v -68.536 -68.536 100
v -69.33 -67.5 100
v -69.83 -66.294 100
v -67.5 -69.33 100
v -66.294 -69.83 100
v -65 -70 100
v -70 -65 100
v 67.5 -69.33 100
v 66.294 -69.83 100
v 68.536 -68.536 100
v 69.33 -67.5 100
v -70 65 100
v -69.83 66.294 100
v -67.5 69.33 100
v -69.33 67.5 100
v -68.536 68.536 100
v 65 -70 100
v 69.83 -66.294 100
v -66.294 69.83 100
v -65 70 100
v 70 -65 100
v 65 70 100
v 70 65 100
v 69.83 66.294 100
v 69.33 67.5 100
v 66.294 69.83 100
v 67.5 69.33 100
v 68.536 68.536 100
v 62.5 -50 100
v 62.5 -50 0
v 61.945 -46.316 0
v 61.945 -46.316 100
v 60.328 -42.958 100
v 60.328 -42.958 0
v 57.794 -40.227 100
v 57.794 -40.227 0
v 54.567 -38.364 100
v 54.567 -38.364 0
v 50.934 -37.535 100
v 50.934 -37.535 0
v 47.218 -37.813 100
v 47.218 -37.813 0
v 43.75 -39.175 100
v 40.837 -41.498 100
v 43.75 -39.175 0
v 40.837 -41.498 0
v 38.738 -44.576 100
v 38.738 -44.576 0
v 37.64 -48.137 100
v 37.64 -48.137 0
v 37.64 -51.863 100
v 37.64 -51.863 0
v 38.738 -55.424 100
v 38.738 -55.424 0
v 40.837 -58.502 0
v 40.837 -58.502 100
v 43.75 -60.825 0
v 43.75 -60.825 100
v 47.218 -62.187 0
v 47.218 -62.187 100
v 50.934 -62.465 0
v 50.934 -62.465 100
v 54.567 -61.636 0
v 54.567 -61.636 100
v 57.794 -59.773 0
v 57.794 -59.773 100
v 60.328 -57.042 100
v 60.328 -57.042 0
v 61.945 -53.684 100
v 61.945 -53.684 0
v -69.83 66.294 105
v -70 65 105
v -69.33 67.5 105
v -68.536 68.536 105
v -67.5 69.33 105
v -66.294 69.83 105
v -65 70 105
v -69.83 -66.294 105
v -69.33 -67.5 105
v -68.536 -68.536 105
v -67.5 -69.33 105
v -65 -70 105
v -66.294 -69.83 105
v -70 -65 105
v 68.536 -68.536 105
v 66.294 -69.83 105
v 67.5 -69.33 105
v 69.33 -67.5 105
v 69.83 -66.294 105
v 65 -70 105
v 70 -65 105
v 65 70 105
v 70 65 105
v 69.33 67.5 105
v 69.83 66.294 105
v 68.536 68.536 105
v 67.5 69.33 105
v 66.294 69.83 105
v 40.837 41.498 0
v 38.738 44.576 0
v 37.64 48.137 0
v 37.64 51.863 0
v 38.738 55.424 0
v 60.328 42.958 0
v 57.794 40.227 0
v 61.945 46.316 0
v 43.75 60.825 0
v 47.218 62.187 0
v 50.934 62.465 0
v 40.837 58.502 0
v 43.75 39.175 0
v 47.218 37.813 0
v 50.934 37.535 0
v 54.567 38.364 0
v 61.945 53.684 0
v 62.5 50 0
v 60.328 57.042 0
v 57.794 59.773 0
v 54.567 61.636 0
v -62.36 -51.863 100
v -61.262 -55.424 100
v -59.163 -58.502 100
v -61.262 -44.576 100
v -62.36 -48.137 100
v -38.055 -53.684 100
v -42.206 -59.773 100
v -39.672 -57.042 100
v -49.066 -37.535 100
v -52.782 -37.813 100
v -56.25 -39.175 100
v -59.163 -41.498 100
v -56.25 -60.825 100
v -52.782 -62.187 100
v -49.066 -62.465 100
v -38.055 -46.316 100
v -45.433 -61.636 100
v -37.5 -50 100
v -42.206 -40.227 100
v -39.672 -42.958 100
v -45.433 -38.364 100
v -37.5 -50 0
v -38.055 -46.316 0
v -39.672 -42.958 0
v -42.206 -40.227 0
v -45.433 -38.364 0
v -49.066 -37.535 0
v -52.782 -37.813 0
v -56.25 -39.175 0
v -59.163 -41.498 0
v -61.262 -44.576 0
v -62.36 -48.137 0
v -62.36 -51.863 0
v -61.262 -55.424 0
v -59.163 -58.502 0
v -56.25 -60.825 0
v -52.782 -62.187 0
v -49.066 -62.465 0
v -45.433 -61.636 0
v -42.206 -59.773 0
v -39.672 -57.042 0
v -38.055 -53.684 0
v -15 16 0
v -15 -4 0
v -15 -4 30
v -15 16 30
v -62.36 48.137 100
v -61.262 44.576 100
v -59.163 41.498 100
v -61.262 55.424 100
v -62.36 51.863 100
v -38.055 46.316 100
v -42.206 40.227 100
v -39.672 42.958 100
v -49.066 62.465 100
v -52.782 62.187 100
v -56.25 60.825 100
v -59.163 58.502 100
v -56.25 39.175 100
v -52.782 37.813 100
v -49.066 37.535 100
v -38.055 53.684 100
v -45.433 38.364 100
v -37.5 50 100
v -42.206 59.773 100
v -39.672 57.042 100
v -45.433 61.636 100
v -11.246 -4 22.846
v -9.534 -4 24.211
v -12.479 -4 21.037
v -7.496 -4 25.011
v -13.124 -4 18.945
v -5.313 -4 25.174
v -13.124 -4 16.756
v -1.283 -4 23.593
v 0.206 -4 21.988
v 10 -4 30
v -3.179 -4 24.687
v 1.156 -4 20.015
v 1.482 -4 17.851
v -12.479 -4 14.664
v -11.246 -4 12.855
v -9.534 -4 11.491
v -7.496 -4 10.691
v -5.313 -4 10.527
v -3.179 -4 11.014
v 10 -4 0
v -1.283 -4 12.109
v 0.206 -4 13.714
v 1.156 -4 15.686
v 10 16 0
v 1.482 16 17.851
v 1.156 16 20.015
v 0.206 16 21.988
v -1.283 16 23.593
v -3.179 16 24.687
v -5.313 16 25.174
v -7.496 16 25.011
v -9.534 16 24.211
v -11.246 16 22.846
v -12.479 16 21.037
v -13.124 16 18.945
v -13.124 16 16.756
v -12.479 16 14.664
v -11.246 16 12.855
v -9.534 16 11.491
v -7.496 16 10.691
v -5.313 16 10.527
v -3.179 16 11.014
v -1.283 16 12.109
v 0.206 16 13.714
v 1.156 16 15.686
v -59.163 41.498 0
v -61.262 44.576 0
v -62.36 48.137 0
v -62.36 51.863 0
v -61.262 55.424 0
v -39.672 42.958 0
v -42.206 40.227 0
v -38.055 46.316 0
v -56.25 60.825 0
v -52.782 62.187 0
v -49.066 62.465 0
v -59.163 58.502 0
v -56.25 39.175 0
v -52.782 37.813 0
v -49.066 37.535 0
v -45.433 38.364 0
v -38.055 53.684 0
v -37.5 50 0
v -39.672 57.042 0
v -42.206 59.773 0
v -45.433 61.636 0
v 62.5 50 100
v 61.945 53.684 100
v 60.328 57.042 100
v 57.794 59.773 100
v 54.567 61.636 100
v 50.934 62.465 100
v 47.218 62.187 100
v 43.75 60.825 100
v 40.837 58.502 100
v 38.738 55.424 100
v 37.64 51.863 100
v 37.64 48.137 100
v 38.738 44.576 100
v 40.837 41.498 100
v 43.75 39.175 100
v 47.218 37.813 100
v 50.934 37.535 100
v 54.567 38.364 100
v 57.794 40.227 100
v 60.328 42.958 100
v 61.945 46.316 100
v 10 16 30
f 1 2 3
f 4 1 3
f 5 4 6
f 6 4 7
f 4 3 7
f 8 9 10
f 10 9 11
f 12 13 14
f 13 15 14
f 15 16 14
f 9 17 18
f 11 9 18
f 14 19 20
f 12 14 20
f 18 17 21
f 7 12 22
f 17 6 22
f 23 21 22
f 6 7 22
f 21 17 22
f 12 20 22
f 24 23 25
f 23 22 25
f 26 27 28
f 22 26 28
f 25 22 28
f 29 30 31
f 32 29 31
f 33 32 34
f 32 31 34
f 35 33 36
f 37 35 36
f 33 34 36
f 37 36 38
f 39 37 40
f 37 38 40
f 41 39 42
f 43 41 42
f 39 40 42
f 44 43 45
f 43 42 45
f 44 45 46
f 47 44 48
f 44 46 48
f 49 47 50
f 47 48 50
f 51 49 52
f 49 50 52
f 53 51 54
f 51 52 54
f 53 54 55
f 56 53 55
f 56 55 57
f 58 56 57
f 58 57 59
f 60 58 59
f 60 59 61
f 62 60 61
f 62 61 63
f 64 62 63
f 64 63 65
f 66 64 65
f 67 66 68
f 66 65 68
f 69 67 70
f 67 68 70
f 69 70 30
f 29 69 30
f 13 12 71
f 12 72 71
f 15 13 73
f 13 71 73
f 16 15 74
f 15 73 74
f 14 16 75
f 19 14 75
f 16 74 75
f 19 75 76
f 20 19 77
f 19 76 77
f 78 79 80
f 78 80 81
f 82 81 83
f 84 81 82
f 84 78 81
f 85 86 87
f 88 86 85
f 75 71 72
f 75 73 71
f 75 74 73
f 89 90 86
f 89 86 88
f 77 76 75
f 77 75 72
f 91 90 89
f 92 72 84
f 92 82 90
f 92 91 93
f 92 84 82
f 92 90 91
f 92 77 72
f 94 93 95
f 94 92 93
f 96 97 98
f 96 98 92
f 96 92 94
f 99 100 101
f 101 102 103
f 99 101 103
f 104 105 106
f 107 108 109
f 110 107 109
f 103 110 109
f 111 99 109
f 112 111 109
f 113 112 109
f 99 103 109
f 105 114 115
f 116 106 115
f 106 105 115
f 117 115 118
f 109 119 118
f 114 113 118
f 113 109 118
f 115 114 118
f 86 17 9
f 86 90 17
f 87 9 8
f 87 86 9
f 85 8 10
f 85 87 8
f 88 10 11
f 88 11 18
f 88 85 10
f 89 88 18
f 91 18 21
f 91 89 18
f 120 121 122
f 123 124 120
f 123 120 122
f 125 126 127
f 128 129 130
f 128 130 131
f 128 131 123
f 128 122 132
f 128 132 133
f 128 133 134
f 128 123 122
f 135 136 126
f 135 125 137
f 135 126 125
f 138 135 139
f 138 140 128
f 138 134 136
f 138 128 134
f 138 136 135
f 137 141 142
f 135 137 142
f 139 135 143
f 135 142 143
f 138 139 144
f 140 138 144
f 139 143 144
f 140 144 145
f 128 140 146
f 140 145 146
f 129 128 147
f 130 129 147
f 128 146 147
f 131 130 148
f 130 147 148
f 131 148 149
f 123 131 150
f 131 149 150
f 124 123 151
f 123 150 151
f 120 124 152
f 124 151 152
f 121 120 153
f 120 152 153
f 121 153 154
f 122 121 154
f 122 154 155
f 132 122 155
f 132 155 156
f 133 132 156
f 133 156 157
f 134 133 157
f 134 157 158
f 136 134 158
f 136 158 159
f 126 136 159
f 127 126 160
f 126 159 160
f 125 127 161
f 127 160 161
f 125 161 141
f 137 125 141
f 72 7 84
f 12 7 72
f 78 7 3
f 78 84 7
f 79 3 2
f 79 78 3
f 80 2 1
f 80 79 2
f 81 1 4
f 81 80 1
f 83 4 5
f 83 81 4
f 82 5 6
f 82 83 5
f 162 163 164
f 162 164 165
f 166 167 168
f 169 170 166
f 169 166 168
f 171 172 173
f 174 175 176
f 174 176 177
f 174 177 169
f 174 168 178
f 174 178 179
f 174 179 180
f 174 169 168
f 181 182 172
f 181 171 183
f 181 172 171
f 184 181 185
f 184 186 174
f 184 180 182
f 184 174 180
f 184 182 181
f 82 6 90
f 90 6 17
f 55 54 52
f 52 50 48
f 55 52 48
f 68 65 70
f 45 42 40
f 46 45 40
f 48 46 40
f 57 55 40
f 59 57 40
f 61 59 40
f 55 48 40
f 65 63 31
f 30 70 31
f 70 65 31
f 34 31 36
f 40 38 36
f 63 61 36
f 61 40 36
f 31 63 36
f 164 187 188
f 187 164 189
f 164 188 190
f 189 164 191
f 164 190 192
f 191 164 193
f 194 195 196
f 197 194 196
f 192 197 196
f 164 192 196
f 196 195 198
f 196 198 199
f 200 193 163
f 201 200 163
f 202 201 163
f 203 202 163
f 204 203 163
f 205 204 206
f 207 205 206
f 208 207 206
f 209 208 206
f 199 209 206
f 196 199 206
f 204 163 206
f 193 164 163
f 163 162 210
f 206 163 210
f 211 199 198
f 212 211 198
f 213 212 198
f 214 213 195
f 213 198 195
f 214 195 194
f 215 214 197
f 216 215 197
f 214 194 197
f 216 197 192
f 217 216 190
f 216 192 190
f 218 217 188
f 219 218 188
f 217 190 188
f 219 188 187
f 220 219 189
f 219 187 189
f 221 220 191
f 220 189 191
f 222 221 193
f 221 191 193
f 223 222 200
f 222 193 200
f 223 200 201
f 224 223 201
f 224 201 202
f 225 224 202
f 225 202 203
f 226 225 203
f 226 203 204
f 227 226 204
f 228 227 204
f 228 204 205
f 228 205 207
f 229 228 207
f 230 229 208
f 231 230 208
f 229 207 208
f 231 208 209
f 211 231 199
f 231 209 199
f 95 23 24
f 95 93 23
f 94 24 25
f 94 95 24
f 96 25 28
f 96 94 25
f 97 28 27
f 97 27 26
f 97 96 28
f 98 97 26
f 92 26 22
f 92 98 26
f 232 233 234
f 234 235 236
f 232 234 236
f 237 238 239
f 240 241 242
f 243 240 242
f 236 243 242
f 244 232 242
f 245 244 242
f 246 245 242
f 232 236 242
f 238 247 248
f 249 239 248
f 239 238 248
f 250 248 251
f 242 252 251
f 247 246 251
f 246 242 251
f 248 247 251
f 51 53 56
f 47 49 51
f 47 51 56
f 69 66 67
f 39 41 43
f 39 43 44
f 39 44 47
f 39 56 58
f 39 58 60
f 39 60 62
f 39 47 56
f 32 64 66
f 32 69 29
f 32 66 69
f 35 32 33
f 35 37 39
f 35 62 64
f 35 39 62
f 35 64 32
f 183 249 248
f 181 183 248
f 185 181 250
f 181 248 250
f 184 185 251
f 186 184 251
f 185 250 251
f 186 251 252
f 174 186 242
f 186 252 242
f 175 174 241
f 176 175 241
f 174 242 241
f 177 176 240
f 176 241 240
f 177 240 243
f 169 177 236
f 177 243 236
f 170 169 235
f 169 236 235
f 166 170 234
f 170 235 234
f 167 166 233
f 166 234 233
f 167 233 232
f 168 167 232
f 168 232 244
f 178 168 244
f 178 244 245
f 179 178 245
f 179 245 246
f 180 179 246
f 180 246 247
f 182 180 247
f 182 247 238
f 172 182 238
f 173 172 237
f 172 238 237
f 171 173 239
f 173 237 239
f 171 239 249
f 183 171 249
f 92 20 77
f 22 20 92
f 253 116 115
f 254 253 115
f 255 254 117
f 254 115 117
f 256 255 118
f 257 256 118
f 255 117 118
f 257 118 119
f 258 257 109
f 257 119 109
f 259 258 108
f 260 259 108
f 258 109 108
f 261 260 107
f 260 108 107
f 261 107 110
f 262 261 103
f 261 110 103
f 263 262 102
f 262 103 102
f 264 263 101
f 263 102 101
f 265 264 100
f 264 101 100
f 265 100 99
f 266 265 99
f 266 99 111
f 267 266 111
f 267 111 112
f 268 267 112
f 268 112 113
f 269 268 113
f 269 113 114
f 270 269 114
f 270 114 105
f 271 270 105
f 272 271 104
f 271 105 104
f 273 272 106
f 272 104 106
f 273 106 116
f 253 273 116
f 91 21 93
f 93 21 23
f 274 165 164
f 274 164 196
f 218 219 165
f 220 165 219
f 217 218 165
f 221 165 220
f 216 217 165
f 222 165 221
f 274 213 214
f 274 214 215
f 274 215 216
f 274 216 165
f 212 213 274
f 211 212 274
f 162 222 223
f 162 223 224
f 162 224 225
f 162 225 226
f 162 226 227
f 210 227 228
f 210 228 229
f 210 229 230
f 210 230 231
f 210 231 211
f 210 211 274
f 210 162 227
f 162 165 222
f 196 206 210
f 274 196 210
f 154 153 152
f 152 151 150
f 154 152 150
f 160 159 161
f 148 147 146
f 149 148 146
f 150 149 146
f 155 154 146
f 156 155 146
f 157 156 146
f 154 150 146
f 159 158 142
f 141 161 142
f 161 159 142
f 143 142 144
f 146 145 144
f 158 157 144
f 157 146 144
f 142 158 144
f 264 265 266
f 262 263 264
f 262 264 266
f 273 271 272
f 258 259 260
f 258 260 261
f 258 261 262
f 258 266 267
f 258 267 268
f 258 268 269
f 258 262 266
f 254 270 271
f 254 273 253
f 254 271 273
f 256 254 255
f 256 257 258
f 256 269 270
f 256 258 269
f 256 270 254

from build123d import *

# Parameters (mm, degrees)
F0_W     = 25
F0_H     = 20
F1_DEPTH = 30
F2_R     = 7.344135
F3_DEPTH = 20
F4_R     = 12.5
F5_DEPTH = 100
F6_W     = 140
F6_H     = 140
F7_DEPTH = 5
F8_R     = 5


with BuildPart() as f1:
    # F0 (on Top) → F1 (new body)
    with BuildSketch(Plane.XY):
        with Locations((-2.5, 6)):
            Rectangle(F0_W, F0_H)
    extrude(amount=F1_DEPTH)

    # F2 (on face) → F3 (cut, through all)
    with BuildSketch(Plane.XZ.offset(4)):
        with Locations((-5.862038, 17.850745)):
            Circle(F2_R)
    extrude(amount=-F3_DEPTH, mode=Mode.SUBTRACT)


with BuildPart() as f5:
    # F4 (on Top) → F5 (new body)
    with BuildSketch(Plane.XY):
        with Locations((-50, -50)):
            Circle(F4_R)
        with Locations((-50, 50)):
            Circle(F4_R)
        with Locations((50, 50)):
            Circle(F4_R)
        with Locations((50, -50)):
            Circle(F4_R)
    extrude(amount=F5_DEPTH)


with BuildPart() as f7:
    # F6 (on face) → F7 (new body)
    with BuildSketch(Plane.XY.offset(100)):
        Rectangle(F6_W, F6_H)
    extrude(amount=F7_DEPTH)

    # F8
    f8_edges = [f7.edges().sort_by_distance(p)[0] for p in [
        (-70, -70, 102.5),
        (70, -70, 102.5),
        (70, 70, 102.5),
        (-70, 70, 102.5),
    ]]
    fillet(f8_edges, radius=F8_R)


solid = Compound([f1.part, f5.part, f7.part])
